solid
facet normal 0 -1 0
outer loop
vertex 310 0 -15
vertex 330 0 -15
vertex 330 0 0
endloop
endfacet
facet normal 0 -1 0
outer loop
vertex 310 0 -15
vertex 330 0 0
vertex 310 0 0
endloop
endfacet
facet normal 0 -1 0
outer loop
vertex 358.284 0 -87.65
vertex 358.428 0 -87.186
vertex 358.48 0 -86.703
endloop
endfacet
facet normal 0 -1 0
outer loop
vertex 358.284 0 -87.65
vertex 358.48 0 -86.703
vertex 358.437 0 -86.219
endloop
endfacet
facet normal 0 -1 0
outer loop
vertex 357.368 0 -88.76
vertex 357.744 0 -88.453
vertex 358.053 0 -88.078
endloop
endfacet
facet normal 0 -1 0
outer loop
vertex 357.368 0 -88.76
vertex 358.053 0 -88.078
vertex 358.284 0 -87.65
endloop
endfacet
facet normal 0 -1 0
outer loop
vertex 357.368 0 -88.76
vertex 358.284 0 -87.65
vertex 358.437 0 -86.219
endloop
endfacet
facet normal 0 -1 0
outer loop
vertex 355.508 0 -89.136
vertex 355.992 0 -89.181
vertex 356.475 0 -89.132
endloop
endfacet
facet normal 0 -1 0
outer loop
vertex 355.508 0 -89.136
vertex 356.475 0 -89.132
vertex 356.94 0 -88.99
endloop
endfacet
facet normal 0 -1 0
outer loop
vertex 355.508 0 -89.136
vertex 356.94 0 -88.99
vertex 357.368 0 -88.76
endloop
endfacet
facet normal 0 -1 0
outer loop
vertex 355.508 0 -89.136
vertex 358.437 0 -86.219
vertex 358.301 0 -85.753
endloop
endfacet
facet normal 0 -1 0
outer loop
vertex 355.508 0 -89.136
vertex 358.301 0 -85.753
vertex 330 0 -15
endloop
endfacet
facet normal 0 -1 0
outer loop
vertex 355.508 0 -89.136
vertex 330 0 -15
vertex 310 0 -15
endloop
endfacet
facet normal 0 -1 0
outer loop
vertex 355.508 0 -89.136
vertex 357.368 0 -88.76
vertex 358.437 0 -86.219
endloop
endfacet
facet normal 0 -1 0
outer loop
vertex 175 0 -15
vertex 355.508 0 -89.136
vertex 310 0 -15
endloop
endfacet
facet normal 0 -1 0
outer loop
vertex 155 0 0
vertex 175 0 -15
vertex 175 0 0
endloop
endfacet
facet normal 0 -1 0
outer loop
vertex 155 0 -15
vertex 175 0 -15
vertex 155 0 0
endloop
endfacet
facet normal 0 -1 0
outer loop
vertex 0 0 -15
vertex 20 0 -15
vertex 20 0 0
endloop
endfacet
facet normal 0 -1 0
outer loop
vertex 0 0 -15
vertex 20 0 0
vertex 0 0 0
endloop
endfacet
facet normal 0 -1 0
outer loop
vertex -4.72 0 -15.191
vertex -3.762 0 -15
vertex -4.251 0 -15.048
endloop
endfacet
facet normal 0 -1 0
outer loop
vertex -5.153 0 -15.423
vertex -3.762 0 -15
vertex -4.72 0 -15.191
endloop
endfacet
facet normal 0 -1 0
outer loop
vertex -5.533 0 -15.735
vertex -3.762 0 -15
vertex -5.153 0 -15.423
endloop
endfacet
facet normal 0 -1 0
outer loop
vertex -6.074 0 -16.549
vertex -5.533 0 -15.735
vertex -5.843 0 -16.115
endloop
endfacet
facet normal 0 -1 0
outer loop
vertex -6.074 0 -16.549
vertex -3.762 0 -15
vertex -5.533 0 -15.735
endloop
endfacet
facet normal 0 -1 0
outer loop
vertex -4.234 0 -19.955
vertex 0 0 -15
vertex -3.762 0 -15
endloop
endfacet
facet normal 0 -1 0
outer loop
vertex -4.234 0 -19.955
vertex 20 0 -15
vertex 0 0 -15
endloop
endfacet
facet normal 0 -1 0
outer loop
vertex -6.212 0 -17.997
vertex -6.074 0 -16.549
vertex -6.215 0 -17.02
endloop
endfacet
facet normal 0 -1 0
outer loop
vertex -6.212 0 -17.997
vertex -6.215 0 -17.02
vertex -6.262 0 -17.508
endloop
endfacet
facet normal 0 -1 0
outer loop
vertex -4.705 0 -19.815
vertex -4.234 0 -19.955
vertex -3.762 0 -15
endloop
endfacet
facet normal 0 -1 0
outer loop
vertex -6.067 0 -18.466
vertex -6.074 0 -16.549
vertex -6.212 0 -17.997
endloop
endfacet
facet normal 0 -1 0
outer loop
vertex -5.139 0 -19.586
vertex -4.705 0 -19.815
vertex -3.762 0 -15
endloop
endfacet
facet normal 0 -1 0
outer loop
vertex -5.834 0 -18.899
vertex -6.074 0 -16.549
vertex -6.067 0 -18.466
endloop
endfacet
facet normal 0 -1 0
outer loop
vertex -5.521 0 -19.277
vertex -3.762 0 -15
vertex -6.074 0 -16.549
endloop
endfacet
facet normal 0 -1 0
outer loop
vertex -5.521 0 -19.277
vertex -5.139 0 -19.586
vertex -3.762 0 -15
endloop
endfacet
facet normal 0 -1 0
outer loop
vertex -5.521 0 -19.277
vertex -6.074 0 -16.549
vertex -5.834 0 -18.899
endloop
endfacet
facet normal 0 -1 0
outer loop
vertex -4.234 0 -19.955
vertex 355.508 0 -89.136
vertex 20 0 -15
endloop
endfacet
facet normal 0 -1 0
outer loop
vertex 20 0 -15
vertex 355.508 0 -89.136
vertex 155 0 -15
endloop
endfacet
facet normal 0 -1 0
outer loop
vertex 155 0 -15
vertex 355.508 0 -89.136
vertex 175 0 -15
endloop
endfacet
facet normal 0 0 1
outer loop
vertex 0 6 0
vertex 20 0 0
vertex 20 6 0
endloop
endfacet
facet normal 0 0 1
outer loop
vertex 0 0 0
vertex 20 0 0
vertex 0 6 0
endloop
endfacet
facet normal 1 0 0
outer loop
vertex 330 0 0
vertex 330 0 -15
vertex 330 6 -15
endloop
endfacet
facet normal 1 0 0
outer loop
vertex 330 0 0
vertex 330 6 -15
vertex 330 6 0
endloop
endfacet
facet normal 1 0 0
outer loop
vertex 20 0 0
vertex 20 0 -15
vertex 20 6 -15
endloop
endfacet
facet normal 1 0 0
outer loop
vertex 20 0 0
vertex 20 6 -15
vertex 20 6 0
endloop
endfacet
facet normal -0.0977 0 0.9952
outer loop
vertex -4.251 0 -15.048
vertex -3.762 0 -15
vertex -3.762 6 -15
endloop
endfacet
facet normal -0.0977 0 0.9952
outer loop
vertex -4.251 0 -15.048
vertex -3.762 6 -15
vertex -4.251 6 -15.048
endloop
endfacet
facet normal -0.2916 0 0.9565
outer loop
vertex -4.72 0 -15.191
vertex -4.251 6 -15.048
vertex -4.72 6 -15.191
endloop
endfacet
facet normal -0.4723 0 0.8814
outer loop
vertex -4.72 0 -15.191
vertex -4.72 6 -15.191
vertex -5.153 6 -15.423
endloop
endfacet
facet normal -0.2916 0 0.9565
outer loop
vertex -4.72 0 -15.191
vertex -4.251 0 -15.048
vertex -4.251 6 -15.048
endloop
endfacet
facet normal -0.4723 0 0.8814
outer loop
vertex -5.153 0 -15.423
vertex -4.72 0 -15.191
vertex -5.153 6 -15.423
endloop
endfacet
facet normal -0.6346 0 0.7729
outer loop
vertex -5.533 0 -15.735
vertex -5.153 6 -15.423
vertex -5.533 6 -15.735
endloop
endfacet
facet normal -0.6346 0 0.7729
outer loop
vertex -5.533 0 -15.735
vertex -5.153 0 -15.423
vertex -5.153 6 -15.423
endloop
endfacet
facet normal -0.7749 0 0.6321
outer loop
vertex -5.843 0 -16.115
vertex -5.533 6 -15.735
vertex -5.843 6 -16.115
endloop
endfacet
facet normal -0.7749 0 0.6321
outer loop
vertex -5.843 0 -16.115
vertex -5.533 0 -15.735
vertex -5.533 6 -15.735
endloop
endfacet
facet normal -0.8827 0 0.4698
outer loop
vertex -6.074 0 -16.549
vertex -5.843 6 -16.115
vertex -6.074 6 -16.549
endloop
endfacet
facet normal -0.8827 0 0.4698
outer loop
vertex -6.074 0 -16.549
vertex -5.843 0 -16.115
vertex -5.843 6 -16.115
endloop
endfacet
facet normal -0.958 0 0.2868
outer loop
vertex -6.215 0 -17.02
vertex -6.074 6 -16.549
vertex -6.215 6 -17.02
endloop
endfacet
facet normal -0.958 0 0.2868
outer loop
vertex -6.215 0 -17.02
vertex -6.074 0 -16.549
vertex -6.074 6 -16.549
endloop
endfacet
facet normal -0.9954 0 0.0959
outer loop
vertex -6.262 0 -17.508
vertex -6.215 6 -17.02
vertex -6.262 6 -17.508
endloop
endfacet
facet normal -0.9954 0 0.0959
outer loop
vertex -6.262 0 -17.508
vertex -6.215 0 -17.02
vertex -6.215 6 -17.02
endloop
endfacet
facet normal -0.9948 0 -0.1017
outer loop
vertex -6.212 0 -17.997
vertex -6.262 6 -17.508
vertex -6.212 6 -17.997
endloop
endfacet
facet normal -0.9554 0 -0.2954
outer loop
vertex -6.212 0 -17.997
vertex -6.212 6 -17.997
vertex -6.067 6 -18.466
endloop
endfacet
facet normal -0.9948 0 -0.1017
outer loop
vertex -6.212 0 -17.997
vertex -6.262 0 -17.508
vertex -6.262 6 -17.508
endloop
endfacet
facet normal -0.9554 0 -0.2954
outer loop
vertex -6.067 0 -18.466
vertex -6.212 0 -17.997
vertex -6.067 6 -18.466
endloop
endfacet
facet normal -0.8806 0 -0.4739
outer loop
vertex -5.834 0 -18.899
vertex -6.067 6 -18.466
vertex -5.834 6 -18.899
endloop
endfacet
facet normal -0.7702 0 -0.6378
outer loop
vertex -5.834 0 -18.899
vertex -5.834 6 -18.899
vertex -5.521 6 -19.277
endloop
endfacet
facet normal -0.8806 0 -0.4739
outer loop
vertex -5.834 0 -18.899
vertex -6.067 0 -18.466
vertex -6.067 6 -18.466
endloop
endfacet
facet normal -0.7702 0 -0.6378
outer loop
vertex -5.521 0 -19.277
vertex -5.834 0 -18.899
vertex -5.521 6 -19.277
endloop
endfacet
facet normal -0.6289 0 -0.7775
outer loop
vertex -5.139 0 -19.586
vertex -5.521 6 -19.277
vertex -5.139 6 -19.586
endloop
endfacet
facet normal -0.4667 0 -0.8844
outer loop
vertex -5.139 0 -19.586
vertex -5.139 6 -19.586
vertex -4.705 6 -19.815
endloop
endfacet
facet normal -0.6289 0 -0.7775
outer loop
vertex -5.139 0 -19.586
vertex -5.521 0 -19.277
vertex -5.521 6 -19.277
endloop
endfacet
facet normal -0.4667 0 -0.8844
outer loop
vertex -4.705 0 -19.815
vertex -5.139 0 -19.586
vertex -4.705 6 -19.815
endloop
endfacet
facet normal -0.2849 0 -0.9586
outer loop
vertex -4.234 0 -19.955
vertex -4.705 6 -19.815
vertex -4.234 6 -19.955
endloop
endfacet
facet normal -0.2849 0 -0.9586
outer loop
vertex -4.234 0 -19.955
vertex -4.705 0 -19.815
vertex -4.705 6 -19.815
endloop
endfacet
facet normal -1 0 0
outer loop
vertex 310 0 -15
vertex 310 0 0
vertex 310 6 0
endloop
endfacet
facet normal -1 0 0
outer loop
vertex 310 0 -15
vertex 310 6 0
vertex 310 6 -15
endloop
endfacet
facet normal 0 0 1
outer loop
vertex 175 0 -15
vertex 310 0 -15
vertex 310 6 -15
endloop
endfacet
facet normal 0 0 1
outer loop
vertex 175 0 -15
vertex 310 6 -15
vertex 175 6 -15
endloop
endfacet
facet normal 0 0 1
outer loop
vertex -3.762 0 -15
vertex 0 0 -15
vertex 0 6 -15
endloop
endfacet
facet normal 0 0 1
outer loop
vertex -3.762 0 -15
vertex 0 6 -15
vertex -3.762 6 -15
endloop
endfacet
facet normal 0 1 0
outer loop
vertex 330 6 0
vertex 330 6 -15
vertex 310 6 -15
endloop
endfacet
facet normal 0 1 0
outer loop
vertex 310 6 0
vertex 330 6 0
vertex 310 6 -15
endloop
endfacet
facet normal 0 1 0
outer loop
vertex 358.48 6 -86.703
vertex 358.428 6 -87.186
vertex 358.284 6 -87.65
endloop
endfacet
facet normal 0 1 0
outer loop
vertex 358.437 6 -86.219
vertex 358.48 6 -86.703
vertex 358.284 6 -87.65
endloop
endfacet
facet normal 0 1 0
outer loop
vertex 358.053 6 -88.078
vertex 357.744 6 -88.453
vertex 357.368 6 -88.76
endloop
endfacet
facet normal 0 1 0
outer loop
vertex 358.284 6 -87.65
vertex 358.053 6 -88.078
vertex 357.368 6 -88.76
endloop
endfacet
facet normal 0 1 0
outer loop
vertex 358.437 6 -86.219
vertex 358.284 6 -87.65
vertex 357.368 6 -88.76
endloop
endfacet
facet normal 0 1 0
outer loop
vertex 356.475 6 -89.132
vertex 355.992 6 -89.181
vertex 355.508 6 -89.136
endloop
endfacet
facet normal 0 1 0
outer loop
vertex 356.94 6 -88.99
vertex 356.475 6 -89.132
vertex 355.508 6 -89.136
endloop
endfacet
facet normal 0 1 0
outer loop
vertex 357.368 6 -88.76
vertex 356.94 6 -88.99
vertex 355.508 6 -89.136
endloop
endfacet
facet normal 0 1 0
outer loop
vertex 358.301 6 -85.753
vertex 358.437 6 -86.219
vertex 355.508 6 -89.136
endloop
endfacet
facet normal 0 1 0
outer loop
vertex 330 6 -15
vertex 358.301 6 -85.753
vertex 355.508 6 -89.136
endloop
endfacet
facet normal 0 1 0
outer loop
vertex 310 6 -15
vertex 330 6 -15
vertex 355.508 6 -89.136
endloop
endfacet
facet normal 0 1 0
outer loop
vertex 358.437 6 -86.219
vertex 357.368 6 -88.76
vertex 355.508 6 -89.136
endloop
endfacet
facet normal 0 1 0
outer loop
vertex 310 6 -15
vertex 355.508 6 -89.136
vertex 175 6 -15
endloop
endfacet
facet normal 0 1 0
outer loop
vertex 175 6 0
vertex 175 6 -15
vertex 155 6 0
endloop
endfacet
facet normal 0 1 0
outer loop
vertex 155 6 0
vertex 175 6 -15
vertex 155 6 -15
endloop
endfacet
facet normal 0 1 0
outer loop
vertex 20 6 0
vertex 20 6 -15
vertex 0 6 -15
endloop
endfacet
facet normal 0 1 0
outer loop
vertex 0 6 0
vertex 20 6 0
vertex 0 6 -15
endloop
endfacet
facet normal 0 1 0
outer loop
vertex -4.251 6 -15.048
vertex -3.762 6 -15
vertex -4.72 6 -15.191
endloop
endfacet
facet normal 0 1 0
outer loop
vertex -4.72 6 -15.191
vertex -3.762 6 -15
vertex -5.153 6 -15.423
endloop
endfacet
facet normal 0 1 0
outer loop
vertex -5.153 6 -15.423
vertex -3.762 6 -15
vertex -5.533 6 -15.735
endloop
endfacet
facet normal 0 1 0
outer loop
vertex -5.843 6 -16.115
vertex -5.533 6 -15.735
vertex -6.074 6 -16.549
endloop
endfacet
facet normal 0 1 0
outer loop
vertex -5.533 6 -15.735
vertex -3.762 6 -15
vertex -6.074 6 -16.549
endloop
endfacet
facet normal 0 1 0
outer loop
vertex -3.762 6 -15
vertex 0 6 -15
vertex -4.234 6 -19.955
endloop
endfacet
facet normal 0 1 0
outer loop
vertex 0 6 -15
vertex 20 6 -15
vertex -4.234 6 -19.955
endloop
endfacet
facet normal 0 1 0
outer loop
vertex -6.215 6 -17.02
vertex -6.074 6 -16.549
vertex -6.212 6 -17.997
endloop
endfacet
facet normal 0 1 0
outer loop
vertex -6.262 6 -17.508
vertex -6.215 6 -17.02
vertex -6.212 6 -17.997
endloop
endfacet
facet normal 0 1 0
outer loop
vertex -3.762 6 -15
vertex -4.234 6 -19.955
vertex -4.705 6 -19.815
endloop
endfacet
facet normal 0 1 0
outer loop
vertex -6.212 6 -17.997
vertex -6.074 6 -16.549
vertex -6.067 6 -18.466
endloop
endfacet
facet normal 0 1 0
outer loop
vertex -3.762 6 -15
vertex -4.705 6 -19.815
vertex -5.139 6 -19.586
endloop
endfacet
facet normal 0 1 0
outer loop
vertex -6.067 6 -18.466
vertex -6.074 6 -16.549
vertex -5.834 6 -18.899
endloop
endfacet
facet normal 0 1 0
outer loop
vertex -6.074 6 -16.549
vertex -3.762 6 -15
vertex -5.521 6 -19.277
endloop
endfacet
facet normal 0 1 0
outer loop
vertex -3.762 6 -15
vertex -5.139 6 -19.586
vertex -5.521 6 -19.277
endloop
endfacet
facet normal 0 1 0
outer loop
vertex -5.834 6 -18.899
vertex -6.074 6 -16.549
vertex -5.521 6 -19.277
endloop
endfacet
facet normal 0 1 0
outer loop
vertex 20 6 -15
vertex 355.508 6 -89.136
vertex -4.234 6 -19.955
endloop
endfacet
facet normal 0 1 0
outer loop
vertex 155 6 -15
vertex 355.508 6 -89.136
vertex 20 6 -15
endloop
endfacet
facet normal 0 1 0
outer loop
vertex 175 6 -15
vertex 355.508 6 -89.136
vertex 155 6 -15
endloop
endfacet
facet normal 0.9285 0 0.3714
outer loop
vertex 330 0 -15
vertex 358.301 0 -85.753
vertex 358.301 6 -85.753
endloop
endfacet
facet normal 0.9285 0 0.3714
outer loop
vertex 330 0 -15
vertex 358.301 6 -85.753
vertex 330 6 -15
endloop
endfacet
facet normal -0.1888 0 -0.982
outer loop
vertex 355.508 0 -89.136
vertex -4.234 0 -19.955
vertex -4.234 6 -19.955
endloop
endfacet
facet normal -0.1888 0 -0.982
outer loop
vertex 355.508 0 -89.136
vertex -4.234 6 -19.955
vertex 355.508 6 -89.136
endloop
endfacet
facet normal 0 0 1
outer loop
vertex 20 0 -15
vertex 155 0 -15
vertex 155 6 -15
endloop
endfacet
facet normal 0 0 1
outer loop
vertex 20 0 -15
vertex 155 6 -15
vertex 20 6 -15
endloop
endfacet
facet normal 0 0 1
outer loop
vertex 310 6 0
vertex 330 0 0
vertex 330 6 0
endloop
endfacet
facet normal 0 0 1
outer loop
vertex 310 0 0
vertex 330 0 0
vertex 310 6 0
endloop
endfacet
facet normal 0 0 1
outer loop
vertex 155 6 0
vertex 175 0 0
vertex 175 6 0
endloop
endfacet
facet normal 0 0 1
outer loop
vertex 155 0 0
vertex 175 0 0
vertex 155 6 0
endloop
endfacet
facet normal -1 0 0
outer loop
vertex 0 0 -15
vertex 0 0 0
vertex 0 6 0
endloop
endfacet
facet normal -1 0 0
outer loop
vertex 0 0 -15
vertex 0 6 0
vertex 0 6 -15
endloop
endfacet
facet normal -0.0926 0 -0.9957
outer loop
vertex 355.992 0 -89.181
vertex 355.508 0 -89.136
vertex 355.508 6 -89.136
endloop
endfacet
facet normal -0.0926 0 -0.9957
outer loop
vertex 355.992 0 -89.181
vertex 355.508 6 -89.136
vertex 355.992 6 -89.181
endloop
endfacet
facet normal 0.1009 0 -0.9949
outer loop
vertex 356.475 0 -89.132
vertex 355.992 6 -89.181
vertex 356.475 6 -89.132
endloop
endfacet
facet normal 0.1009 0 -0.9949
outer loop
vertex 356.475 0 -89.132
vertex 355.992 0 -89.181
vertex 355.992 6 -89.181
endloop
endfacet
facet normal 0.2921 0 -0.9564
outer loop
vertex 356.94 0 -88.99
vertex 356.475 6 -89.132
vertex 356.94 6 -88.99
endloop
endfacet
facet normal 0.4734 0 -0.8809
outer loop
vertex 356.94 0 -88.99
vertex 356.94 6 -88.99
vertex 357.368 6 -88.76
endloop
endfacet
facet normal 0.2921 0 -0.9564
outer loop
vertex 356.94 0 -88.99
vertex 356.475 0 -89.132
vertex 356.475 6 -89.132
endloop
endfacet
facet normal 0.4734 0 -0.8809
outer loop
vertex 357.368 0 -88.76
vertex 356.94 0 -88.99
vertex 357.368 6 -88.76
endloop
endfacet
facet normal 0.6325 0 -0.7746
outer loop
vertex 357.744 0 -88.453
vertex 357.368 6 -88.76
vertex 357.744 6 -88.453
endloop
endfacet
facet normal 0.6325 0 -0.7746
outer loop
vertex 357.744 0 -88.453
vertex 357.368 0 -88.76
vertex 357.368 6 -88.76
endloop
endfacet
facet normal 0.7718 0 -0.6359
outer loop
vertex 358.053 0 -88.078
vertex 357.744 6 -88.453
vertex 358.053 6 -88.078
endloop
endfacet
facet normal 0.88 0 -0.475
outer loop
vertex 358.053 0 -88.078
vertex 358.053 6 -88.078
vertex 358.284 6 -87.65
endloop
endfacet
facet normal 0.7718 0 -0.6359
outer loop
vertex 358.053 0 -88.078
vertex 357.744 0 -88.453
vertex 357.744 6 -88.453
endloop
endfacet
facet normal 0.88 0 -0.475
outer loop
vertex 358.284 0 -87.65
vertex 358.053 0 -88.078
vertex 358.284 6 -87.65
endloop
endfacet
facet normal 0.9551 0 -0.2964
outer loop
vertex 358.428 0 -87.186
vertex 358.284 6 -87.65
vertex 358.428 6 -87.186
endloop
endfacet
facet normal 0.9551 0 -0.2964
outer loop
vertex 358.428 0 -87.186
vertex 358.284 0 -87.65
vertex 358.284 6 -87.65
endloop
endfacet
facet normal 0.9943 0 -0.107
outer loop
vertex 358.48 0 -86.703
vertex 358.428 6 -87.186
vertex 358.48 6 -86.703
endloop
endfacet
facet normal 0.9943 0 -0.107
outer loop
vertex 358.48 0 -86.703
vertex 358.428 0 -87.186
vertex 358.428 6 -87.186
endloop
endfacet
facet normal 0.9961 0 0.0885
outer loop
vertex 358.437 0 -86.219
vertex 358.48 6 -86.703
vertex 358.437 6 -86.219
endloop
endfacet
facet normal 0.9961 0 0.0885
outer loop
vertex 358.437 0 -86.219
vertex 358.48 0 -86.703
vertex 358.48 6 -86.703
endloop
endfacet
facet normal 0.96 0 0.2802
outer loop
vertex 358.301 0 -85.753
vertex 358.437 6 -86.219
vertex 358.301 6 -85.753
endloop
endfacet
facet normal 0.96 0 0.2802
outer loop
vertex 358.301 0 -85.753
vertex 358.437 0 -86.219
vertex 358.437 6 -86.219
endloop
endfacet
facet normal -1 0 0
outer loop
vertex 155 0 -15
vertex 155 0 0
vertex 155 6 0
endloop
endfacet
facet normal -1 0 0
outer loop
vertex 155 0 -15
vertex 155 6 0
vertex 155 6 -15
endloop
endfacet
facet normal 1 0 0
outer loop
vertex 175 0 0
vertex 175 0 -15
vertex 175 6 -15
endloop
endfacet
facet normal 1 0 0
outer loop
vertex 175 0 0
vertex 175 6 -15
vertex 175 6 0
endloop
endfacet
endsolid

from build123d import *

# Parameters (mm, degrees)
RESSALTO_EXTRUS_O1_DEPTH = 6


with BuildPart() as part:
    # Esboço1 → Ressalto-extrusão1 (new body)
    with BuildSketch(Plane(origin=(0, 0, 0), x_dir=(1, 0, 0), z_dir=(0, 1, 0))):
        with BuildLine():
            Line((-4.233916189, 19.955016117), (355.507733721, 89.136102639))
            ThreePointArc((355.507733721, 89.136102639), (357.907745838, 88.272697698), (358.301043932, 85.75260983))
            Line((358.301043932, 85.75260983), (330, 15))
            Line((330, 15), (330, 0))
            Line((330, 0), (310, 0))
            Line((310, 0), (310, 15))
            Line((310, 15), (175, 15))
            Line((175, 15), (175, 0))
            Line((175, 0), (155, 0))
            Line((155, 0), (155, 15))
            Line((155, 15), (20, 15))
            Line((20, 15), (20, 0))
            Line((20, 0), (0, 0))
            Line((0, 0), (0, 15))
            Line((0, 15), (-3.761797705, 15))
            ThreePointArc((-3.761797705, 15), (-6.250526326, 17.262871653), (-4.233916189, 19.955016117))
        make_face()
    extrude(amount=RESSALTO_EXTRUS_O1_DEPTH)


solid = part.part
